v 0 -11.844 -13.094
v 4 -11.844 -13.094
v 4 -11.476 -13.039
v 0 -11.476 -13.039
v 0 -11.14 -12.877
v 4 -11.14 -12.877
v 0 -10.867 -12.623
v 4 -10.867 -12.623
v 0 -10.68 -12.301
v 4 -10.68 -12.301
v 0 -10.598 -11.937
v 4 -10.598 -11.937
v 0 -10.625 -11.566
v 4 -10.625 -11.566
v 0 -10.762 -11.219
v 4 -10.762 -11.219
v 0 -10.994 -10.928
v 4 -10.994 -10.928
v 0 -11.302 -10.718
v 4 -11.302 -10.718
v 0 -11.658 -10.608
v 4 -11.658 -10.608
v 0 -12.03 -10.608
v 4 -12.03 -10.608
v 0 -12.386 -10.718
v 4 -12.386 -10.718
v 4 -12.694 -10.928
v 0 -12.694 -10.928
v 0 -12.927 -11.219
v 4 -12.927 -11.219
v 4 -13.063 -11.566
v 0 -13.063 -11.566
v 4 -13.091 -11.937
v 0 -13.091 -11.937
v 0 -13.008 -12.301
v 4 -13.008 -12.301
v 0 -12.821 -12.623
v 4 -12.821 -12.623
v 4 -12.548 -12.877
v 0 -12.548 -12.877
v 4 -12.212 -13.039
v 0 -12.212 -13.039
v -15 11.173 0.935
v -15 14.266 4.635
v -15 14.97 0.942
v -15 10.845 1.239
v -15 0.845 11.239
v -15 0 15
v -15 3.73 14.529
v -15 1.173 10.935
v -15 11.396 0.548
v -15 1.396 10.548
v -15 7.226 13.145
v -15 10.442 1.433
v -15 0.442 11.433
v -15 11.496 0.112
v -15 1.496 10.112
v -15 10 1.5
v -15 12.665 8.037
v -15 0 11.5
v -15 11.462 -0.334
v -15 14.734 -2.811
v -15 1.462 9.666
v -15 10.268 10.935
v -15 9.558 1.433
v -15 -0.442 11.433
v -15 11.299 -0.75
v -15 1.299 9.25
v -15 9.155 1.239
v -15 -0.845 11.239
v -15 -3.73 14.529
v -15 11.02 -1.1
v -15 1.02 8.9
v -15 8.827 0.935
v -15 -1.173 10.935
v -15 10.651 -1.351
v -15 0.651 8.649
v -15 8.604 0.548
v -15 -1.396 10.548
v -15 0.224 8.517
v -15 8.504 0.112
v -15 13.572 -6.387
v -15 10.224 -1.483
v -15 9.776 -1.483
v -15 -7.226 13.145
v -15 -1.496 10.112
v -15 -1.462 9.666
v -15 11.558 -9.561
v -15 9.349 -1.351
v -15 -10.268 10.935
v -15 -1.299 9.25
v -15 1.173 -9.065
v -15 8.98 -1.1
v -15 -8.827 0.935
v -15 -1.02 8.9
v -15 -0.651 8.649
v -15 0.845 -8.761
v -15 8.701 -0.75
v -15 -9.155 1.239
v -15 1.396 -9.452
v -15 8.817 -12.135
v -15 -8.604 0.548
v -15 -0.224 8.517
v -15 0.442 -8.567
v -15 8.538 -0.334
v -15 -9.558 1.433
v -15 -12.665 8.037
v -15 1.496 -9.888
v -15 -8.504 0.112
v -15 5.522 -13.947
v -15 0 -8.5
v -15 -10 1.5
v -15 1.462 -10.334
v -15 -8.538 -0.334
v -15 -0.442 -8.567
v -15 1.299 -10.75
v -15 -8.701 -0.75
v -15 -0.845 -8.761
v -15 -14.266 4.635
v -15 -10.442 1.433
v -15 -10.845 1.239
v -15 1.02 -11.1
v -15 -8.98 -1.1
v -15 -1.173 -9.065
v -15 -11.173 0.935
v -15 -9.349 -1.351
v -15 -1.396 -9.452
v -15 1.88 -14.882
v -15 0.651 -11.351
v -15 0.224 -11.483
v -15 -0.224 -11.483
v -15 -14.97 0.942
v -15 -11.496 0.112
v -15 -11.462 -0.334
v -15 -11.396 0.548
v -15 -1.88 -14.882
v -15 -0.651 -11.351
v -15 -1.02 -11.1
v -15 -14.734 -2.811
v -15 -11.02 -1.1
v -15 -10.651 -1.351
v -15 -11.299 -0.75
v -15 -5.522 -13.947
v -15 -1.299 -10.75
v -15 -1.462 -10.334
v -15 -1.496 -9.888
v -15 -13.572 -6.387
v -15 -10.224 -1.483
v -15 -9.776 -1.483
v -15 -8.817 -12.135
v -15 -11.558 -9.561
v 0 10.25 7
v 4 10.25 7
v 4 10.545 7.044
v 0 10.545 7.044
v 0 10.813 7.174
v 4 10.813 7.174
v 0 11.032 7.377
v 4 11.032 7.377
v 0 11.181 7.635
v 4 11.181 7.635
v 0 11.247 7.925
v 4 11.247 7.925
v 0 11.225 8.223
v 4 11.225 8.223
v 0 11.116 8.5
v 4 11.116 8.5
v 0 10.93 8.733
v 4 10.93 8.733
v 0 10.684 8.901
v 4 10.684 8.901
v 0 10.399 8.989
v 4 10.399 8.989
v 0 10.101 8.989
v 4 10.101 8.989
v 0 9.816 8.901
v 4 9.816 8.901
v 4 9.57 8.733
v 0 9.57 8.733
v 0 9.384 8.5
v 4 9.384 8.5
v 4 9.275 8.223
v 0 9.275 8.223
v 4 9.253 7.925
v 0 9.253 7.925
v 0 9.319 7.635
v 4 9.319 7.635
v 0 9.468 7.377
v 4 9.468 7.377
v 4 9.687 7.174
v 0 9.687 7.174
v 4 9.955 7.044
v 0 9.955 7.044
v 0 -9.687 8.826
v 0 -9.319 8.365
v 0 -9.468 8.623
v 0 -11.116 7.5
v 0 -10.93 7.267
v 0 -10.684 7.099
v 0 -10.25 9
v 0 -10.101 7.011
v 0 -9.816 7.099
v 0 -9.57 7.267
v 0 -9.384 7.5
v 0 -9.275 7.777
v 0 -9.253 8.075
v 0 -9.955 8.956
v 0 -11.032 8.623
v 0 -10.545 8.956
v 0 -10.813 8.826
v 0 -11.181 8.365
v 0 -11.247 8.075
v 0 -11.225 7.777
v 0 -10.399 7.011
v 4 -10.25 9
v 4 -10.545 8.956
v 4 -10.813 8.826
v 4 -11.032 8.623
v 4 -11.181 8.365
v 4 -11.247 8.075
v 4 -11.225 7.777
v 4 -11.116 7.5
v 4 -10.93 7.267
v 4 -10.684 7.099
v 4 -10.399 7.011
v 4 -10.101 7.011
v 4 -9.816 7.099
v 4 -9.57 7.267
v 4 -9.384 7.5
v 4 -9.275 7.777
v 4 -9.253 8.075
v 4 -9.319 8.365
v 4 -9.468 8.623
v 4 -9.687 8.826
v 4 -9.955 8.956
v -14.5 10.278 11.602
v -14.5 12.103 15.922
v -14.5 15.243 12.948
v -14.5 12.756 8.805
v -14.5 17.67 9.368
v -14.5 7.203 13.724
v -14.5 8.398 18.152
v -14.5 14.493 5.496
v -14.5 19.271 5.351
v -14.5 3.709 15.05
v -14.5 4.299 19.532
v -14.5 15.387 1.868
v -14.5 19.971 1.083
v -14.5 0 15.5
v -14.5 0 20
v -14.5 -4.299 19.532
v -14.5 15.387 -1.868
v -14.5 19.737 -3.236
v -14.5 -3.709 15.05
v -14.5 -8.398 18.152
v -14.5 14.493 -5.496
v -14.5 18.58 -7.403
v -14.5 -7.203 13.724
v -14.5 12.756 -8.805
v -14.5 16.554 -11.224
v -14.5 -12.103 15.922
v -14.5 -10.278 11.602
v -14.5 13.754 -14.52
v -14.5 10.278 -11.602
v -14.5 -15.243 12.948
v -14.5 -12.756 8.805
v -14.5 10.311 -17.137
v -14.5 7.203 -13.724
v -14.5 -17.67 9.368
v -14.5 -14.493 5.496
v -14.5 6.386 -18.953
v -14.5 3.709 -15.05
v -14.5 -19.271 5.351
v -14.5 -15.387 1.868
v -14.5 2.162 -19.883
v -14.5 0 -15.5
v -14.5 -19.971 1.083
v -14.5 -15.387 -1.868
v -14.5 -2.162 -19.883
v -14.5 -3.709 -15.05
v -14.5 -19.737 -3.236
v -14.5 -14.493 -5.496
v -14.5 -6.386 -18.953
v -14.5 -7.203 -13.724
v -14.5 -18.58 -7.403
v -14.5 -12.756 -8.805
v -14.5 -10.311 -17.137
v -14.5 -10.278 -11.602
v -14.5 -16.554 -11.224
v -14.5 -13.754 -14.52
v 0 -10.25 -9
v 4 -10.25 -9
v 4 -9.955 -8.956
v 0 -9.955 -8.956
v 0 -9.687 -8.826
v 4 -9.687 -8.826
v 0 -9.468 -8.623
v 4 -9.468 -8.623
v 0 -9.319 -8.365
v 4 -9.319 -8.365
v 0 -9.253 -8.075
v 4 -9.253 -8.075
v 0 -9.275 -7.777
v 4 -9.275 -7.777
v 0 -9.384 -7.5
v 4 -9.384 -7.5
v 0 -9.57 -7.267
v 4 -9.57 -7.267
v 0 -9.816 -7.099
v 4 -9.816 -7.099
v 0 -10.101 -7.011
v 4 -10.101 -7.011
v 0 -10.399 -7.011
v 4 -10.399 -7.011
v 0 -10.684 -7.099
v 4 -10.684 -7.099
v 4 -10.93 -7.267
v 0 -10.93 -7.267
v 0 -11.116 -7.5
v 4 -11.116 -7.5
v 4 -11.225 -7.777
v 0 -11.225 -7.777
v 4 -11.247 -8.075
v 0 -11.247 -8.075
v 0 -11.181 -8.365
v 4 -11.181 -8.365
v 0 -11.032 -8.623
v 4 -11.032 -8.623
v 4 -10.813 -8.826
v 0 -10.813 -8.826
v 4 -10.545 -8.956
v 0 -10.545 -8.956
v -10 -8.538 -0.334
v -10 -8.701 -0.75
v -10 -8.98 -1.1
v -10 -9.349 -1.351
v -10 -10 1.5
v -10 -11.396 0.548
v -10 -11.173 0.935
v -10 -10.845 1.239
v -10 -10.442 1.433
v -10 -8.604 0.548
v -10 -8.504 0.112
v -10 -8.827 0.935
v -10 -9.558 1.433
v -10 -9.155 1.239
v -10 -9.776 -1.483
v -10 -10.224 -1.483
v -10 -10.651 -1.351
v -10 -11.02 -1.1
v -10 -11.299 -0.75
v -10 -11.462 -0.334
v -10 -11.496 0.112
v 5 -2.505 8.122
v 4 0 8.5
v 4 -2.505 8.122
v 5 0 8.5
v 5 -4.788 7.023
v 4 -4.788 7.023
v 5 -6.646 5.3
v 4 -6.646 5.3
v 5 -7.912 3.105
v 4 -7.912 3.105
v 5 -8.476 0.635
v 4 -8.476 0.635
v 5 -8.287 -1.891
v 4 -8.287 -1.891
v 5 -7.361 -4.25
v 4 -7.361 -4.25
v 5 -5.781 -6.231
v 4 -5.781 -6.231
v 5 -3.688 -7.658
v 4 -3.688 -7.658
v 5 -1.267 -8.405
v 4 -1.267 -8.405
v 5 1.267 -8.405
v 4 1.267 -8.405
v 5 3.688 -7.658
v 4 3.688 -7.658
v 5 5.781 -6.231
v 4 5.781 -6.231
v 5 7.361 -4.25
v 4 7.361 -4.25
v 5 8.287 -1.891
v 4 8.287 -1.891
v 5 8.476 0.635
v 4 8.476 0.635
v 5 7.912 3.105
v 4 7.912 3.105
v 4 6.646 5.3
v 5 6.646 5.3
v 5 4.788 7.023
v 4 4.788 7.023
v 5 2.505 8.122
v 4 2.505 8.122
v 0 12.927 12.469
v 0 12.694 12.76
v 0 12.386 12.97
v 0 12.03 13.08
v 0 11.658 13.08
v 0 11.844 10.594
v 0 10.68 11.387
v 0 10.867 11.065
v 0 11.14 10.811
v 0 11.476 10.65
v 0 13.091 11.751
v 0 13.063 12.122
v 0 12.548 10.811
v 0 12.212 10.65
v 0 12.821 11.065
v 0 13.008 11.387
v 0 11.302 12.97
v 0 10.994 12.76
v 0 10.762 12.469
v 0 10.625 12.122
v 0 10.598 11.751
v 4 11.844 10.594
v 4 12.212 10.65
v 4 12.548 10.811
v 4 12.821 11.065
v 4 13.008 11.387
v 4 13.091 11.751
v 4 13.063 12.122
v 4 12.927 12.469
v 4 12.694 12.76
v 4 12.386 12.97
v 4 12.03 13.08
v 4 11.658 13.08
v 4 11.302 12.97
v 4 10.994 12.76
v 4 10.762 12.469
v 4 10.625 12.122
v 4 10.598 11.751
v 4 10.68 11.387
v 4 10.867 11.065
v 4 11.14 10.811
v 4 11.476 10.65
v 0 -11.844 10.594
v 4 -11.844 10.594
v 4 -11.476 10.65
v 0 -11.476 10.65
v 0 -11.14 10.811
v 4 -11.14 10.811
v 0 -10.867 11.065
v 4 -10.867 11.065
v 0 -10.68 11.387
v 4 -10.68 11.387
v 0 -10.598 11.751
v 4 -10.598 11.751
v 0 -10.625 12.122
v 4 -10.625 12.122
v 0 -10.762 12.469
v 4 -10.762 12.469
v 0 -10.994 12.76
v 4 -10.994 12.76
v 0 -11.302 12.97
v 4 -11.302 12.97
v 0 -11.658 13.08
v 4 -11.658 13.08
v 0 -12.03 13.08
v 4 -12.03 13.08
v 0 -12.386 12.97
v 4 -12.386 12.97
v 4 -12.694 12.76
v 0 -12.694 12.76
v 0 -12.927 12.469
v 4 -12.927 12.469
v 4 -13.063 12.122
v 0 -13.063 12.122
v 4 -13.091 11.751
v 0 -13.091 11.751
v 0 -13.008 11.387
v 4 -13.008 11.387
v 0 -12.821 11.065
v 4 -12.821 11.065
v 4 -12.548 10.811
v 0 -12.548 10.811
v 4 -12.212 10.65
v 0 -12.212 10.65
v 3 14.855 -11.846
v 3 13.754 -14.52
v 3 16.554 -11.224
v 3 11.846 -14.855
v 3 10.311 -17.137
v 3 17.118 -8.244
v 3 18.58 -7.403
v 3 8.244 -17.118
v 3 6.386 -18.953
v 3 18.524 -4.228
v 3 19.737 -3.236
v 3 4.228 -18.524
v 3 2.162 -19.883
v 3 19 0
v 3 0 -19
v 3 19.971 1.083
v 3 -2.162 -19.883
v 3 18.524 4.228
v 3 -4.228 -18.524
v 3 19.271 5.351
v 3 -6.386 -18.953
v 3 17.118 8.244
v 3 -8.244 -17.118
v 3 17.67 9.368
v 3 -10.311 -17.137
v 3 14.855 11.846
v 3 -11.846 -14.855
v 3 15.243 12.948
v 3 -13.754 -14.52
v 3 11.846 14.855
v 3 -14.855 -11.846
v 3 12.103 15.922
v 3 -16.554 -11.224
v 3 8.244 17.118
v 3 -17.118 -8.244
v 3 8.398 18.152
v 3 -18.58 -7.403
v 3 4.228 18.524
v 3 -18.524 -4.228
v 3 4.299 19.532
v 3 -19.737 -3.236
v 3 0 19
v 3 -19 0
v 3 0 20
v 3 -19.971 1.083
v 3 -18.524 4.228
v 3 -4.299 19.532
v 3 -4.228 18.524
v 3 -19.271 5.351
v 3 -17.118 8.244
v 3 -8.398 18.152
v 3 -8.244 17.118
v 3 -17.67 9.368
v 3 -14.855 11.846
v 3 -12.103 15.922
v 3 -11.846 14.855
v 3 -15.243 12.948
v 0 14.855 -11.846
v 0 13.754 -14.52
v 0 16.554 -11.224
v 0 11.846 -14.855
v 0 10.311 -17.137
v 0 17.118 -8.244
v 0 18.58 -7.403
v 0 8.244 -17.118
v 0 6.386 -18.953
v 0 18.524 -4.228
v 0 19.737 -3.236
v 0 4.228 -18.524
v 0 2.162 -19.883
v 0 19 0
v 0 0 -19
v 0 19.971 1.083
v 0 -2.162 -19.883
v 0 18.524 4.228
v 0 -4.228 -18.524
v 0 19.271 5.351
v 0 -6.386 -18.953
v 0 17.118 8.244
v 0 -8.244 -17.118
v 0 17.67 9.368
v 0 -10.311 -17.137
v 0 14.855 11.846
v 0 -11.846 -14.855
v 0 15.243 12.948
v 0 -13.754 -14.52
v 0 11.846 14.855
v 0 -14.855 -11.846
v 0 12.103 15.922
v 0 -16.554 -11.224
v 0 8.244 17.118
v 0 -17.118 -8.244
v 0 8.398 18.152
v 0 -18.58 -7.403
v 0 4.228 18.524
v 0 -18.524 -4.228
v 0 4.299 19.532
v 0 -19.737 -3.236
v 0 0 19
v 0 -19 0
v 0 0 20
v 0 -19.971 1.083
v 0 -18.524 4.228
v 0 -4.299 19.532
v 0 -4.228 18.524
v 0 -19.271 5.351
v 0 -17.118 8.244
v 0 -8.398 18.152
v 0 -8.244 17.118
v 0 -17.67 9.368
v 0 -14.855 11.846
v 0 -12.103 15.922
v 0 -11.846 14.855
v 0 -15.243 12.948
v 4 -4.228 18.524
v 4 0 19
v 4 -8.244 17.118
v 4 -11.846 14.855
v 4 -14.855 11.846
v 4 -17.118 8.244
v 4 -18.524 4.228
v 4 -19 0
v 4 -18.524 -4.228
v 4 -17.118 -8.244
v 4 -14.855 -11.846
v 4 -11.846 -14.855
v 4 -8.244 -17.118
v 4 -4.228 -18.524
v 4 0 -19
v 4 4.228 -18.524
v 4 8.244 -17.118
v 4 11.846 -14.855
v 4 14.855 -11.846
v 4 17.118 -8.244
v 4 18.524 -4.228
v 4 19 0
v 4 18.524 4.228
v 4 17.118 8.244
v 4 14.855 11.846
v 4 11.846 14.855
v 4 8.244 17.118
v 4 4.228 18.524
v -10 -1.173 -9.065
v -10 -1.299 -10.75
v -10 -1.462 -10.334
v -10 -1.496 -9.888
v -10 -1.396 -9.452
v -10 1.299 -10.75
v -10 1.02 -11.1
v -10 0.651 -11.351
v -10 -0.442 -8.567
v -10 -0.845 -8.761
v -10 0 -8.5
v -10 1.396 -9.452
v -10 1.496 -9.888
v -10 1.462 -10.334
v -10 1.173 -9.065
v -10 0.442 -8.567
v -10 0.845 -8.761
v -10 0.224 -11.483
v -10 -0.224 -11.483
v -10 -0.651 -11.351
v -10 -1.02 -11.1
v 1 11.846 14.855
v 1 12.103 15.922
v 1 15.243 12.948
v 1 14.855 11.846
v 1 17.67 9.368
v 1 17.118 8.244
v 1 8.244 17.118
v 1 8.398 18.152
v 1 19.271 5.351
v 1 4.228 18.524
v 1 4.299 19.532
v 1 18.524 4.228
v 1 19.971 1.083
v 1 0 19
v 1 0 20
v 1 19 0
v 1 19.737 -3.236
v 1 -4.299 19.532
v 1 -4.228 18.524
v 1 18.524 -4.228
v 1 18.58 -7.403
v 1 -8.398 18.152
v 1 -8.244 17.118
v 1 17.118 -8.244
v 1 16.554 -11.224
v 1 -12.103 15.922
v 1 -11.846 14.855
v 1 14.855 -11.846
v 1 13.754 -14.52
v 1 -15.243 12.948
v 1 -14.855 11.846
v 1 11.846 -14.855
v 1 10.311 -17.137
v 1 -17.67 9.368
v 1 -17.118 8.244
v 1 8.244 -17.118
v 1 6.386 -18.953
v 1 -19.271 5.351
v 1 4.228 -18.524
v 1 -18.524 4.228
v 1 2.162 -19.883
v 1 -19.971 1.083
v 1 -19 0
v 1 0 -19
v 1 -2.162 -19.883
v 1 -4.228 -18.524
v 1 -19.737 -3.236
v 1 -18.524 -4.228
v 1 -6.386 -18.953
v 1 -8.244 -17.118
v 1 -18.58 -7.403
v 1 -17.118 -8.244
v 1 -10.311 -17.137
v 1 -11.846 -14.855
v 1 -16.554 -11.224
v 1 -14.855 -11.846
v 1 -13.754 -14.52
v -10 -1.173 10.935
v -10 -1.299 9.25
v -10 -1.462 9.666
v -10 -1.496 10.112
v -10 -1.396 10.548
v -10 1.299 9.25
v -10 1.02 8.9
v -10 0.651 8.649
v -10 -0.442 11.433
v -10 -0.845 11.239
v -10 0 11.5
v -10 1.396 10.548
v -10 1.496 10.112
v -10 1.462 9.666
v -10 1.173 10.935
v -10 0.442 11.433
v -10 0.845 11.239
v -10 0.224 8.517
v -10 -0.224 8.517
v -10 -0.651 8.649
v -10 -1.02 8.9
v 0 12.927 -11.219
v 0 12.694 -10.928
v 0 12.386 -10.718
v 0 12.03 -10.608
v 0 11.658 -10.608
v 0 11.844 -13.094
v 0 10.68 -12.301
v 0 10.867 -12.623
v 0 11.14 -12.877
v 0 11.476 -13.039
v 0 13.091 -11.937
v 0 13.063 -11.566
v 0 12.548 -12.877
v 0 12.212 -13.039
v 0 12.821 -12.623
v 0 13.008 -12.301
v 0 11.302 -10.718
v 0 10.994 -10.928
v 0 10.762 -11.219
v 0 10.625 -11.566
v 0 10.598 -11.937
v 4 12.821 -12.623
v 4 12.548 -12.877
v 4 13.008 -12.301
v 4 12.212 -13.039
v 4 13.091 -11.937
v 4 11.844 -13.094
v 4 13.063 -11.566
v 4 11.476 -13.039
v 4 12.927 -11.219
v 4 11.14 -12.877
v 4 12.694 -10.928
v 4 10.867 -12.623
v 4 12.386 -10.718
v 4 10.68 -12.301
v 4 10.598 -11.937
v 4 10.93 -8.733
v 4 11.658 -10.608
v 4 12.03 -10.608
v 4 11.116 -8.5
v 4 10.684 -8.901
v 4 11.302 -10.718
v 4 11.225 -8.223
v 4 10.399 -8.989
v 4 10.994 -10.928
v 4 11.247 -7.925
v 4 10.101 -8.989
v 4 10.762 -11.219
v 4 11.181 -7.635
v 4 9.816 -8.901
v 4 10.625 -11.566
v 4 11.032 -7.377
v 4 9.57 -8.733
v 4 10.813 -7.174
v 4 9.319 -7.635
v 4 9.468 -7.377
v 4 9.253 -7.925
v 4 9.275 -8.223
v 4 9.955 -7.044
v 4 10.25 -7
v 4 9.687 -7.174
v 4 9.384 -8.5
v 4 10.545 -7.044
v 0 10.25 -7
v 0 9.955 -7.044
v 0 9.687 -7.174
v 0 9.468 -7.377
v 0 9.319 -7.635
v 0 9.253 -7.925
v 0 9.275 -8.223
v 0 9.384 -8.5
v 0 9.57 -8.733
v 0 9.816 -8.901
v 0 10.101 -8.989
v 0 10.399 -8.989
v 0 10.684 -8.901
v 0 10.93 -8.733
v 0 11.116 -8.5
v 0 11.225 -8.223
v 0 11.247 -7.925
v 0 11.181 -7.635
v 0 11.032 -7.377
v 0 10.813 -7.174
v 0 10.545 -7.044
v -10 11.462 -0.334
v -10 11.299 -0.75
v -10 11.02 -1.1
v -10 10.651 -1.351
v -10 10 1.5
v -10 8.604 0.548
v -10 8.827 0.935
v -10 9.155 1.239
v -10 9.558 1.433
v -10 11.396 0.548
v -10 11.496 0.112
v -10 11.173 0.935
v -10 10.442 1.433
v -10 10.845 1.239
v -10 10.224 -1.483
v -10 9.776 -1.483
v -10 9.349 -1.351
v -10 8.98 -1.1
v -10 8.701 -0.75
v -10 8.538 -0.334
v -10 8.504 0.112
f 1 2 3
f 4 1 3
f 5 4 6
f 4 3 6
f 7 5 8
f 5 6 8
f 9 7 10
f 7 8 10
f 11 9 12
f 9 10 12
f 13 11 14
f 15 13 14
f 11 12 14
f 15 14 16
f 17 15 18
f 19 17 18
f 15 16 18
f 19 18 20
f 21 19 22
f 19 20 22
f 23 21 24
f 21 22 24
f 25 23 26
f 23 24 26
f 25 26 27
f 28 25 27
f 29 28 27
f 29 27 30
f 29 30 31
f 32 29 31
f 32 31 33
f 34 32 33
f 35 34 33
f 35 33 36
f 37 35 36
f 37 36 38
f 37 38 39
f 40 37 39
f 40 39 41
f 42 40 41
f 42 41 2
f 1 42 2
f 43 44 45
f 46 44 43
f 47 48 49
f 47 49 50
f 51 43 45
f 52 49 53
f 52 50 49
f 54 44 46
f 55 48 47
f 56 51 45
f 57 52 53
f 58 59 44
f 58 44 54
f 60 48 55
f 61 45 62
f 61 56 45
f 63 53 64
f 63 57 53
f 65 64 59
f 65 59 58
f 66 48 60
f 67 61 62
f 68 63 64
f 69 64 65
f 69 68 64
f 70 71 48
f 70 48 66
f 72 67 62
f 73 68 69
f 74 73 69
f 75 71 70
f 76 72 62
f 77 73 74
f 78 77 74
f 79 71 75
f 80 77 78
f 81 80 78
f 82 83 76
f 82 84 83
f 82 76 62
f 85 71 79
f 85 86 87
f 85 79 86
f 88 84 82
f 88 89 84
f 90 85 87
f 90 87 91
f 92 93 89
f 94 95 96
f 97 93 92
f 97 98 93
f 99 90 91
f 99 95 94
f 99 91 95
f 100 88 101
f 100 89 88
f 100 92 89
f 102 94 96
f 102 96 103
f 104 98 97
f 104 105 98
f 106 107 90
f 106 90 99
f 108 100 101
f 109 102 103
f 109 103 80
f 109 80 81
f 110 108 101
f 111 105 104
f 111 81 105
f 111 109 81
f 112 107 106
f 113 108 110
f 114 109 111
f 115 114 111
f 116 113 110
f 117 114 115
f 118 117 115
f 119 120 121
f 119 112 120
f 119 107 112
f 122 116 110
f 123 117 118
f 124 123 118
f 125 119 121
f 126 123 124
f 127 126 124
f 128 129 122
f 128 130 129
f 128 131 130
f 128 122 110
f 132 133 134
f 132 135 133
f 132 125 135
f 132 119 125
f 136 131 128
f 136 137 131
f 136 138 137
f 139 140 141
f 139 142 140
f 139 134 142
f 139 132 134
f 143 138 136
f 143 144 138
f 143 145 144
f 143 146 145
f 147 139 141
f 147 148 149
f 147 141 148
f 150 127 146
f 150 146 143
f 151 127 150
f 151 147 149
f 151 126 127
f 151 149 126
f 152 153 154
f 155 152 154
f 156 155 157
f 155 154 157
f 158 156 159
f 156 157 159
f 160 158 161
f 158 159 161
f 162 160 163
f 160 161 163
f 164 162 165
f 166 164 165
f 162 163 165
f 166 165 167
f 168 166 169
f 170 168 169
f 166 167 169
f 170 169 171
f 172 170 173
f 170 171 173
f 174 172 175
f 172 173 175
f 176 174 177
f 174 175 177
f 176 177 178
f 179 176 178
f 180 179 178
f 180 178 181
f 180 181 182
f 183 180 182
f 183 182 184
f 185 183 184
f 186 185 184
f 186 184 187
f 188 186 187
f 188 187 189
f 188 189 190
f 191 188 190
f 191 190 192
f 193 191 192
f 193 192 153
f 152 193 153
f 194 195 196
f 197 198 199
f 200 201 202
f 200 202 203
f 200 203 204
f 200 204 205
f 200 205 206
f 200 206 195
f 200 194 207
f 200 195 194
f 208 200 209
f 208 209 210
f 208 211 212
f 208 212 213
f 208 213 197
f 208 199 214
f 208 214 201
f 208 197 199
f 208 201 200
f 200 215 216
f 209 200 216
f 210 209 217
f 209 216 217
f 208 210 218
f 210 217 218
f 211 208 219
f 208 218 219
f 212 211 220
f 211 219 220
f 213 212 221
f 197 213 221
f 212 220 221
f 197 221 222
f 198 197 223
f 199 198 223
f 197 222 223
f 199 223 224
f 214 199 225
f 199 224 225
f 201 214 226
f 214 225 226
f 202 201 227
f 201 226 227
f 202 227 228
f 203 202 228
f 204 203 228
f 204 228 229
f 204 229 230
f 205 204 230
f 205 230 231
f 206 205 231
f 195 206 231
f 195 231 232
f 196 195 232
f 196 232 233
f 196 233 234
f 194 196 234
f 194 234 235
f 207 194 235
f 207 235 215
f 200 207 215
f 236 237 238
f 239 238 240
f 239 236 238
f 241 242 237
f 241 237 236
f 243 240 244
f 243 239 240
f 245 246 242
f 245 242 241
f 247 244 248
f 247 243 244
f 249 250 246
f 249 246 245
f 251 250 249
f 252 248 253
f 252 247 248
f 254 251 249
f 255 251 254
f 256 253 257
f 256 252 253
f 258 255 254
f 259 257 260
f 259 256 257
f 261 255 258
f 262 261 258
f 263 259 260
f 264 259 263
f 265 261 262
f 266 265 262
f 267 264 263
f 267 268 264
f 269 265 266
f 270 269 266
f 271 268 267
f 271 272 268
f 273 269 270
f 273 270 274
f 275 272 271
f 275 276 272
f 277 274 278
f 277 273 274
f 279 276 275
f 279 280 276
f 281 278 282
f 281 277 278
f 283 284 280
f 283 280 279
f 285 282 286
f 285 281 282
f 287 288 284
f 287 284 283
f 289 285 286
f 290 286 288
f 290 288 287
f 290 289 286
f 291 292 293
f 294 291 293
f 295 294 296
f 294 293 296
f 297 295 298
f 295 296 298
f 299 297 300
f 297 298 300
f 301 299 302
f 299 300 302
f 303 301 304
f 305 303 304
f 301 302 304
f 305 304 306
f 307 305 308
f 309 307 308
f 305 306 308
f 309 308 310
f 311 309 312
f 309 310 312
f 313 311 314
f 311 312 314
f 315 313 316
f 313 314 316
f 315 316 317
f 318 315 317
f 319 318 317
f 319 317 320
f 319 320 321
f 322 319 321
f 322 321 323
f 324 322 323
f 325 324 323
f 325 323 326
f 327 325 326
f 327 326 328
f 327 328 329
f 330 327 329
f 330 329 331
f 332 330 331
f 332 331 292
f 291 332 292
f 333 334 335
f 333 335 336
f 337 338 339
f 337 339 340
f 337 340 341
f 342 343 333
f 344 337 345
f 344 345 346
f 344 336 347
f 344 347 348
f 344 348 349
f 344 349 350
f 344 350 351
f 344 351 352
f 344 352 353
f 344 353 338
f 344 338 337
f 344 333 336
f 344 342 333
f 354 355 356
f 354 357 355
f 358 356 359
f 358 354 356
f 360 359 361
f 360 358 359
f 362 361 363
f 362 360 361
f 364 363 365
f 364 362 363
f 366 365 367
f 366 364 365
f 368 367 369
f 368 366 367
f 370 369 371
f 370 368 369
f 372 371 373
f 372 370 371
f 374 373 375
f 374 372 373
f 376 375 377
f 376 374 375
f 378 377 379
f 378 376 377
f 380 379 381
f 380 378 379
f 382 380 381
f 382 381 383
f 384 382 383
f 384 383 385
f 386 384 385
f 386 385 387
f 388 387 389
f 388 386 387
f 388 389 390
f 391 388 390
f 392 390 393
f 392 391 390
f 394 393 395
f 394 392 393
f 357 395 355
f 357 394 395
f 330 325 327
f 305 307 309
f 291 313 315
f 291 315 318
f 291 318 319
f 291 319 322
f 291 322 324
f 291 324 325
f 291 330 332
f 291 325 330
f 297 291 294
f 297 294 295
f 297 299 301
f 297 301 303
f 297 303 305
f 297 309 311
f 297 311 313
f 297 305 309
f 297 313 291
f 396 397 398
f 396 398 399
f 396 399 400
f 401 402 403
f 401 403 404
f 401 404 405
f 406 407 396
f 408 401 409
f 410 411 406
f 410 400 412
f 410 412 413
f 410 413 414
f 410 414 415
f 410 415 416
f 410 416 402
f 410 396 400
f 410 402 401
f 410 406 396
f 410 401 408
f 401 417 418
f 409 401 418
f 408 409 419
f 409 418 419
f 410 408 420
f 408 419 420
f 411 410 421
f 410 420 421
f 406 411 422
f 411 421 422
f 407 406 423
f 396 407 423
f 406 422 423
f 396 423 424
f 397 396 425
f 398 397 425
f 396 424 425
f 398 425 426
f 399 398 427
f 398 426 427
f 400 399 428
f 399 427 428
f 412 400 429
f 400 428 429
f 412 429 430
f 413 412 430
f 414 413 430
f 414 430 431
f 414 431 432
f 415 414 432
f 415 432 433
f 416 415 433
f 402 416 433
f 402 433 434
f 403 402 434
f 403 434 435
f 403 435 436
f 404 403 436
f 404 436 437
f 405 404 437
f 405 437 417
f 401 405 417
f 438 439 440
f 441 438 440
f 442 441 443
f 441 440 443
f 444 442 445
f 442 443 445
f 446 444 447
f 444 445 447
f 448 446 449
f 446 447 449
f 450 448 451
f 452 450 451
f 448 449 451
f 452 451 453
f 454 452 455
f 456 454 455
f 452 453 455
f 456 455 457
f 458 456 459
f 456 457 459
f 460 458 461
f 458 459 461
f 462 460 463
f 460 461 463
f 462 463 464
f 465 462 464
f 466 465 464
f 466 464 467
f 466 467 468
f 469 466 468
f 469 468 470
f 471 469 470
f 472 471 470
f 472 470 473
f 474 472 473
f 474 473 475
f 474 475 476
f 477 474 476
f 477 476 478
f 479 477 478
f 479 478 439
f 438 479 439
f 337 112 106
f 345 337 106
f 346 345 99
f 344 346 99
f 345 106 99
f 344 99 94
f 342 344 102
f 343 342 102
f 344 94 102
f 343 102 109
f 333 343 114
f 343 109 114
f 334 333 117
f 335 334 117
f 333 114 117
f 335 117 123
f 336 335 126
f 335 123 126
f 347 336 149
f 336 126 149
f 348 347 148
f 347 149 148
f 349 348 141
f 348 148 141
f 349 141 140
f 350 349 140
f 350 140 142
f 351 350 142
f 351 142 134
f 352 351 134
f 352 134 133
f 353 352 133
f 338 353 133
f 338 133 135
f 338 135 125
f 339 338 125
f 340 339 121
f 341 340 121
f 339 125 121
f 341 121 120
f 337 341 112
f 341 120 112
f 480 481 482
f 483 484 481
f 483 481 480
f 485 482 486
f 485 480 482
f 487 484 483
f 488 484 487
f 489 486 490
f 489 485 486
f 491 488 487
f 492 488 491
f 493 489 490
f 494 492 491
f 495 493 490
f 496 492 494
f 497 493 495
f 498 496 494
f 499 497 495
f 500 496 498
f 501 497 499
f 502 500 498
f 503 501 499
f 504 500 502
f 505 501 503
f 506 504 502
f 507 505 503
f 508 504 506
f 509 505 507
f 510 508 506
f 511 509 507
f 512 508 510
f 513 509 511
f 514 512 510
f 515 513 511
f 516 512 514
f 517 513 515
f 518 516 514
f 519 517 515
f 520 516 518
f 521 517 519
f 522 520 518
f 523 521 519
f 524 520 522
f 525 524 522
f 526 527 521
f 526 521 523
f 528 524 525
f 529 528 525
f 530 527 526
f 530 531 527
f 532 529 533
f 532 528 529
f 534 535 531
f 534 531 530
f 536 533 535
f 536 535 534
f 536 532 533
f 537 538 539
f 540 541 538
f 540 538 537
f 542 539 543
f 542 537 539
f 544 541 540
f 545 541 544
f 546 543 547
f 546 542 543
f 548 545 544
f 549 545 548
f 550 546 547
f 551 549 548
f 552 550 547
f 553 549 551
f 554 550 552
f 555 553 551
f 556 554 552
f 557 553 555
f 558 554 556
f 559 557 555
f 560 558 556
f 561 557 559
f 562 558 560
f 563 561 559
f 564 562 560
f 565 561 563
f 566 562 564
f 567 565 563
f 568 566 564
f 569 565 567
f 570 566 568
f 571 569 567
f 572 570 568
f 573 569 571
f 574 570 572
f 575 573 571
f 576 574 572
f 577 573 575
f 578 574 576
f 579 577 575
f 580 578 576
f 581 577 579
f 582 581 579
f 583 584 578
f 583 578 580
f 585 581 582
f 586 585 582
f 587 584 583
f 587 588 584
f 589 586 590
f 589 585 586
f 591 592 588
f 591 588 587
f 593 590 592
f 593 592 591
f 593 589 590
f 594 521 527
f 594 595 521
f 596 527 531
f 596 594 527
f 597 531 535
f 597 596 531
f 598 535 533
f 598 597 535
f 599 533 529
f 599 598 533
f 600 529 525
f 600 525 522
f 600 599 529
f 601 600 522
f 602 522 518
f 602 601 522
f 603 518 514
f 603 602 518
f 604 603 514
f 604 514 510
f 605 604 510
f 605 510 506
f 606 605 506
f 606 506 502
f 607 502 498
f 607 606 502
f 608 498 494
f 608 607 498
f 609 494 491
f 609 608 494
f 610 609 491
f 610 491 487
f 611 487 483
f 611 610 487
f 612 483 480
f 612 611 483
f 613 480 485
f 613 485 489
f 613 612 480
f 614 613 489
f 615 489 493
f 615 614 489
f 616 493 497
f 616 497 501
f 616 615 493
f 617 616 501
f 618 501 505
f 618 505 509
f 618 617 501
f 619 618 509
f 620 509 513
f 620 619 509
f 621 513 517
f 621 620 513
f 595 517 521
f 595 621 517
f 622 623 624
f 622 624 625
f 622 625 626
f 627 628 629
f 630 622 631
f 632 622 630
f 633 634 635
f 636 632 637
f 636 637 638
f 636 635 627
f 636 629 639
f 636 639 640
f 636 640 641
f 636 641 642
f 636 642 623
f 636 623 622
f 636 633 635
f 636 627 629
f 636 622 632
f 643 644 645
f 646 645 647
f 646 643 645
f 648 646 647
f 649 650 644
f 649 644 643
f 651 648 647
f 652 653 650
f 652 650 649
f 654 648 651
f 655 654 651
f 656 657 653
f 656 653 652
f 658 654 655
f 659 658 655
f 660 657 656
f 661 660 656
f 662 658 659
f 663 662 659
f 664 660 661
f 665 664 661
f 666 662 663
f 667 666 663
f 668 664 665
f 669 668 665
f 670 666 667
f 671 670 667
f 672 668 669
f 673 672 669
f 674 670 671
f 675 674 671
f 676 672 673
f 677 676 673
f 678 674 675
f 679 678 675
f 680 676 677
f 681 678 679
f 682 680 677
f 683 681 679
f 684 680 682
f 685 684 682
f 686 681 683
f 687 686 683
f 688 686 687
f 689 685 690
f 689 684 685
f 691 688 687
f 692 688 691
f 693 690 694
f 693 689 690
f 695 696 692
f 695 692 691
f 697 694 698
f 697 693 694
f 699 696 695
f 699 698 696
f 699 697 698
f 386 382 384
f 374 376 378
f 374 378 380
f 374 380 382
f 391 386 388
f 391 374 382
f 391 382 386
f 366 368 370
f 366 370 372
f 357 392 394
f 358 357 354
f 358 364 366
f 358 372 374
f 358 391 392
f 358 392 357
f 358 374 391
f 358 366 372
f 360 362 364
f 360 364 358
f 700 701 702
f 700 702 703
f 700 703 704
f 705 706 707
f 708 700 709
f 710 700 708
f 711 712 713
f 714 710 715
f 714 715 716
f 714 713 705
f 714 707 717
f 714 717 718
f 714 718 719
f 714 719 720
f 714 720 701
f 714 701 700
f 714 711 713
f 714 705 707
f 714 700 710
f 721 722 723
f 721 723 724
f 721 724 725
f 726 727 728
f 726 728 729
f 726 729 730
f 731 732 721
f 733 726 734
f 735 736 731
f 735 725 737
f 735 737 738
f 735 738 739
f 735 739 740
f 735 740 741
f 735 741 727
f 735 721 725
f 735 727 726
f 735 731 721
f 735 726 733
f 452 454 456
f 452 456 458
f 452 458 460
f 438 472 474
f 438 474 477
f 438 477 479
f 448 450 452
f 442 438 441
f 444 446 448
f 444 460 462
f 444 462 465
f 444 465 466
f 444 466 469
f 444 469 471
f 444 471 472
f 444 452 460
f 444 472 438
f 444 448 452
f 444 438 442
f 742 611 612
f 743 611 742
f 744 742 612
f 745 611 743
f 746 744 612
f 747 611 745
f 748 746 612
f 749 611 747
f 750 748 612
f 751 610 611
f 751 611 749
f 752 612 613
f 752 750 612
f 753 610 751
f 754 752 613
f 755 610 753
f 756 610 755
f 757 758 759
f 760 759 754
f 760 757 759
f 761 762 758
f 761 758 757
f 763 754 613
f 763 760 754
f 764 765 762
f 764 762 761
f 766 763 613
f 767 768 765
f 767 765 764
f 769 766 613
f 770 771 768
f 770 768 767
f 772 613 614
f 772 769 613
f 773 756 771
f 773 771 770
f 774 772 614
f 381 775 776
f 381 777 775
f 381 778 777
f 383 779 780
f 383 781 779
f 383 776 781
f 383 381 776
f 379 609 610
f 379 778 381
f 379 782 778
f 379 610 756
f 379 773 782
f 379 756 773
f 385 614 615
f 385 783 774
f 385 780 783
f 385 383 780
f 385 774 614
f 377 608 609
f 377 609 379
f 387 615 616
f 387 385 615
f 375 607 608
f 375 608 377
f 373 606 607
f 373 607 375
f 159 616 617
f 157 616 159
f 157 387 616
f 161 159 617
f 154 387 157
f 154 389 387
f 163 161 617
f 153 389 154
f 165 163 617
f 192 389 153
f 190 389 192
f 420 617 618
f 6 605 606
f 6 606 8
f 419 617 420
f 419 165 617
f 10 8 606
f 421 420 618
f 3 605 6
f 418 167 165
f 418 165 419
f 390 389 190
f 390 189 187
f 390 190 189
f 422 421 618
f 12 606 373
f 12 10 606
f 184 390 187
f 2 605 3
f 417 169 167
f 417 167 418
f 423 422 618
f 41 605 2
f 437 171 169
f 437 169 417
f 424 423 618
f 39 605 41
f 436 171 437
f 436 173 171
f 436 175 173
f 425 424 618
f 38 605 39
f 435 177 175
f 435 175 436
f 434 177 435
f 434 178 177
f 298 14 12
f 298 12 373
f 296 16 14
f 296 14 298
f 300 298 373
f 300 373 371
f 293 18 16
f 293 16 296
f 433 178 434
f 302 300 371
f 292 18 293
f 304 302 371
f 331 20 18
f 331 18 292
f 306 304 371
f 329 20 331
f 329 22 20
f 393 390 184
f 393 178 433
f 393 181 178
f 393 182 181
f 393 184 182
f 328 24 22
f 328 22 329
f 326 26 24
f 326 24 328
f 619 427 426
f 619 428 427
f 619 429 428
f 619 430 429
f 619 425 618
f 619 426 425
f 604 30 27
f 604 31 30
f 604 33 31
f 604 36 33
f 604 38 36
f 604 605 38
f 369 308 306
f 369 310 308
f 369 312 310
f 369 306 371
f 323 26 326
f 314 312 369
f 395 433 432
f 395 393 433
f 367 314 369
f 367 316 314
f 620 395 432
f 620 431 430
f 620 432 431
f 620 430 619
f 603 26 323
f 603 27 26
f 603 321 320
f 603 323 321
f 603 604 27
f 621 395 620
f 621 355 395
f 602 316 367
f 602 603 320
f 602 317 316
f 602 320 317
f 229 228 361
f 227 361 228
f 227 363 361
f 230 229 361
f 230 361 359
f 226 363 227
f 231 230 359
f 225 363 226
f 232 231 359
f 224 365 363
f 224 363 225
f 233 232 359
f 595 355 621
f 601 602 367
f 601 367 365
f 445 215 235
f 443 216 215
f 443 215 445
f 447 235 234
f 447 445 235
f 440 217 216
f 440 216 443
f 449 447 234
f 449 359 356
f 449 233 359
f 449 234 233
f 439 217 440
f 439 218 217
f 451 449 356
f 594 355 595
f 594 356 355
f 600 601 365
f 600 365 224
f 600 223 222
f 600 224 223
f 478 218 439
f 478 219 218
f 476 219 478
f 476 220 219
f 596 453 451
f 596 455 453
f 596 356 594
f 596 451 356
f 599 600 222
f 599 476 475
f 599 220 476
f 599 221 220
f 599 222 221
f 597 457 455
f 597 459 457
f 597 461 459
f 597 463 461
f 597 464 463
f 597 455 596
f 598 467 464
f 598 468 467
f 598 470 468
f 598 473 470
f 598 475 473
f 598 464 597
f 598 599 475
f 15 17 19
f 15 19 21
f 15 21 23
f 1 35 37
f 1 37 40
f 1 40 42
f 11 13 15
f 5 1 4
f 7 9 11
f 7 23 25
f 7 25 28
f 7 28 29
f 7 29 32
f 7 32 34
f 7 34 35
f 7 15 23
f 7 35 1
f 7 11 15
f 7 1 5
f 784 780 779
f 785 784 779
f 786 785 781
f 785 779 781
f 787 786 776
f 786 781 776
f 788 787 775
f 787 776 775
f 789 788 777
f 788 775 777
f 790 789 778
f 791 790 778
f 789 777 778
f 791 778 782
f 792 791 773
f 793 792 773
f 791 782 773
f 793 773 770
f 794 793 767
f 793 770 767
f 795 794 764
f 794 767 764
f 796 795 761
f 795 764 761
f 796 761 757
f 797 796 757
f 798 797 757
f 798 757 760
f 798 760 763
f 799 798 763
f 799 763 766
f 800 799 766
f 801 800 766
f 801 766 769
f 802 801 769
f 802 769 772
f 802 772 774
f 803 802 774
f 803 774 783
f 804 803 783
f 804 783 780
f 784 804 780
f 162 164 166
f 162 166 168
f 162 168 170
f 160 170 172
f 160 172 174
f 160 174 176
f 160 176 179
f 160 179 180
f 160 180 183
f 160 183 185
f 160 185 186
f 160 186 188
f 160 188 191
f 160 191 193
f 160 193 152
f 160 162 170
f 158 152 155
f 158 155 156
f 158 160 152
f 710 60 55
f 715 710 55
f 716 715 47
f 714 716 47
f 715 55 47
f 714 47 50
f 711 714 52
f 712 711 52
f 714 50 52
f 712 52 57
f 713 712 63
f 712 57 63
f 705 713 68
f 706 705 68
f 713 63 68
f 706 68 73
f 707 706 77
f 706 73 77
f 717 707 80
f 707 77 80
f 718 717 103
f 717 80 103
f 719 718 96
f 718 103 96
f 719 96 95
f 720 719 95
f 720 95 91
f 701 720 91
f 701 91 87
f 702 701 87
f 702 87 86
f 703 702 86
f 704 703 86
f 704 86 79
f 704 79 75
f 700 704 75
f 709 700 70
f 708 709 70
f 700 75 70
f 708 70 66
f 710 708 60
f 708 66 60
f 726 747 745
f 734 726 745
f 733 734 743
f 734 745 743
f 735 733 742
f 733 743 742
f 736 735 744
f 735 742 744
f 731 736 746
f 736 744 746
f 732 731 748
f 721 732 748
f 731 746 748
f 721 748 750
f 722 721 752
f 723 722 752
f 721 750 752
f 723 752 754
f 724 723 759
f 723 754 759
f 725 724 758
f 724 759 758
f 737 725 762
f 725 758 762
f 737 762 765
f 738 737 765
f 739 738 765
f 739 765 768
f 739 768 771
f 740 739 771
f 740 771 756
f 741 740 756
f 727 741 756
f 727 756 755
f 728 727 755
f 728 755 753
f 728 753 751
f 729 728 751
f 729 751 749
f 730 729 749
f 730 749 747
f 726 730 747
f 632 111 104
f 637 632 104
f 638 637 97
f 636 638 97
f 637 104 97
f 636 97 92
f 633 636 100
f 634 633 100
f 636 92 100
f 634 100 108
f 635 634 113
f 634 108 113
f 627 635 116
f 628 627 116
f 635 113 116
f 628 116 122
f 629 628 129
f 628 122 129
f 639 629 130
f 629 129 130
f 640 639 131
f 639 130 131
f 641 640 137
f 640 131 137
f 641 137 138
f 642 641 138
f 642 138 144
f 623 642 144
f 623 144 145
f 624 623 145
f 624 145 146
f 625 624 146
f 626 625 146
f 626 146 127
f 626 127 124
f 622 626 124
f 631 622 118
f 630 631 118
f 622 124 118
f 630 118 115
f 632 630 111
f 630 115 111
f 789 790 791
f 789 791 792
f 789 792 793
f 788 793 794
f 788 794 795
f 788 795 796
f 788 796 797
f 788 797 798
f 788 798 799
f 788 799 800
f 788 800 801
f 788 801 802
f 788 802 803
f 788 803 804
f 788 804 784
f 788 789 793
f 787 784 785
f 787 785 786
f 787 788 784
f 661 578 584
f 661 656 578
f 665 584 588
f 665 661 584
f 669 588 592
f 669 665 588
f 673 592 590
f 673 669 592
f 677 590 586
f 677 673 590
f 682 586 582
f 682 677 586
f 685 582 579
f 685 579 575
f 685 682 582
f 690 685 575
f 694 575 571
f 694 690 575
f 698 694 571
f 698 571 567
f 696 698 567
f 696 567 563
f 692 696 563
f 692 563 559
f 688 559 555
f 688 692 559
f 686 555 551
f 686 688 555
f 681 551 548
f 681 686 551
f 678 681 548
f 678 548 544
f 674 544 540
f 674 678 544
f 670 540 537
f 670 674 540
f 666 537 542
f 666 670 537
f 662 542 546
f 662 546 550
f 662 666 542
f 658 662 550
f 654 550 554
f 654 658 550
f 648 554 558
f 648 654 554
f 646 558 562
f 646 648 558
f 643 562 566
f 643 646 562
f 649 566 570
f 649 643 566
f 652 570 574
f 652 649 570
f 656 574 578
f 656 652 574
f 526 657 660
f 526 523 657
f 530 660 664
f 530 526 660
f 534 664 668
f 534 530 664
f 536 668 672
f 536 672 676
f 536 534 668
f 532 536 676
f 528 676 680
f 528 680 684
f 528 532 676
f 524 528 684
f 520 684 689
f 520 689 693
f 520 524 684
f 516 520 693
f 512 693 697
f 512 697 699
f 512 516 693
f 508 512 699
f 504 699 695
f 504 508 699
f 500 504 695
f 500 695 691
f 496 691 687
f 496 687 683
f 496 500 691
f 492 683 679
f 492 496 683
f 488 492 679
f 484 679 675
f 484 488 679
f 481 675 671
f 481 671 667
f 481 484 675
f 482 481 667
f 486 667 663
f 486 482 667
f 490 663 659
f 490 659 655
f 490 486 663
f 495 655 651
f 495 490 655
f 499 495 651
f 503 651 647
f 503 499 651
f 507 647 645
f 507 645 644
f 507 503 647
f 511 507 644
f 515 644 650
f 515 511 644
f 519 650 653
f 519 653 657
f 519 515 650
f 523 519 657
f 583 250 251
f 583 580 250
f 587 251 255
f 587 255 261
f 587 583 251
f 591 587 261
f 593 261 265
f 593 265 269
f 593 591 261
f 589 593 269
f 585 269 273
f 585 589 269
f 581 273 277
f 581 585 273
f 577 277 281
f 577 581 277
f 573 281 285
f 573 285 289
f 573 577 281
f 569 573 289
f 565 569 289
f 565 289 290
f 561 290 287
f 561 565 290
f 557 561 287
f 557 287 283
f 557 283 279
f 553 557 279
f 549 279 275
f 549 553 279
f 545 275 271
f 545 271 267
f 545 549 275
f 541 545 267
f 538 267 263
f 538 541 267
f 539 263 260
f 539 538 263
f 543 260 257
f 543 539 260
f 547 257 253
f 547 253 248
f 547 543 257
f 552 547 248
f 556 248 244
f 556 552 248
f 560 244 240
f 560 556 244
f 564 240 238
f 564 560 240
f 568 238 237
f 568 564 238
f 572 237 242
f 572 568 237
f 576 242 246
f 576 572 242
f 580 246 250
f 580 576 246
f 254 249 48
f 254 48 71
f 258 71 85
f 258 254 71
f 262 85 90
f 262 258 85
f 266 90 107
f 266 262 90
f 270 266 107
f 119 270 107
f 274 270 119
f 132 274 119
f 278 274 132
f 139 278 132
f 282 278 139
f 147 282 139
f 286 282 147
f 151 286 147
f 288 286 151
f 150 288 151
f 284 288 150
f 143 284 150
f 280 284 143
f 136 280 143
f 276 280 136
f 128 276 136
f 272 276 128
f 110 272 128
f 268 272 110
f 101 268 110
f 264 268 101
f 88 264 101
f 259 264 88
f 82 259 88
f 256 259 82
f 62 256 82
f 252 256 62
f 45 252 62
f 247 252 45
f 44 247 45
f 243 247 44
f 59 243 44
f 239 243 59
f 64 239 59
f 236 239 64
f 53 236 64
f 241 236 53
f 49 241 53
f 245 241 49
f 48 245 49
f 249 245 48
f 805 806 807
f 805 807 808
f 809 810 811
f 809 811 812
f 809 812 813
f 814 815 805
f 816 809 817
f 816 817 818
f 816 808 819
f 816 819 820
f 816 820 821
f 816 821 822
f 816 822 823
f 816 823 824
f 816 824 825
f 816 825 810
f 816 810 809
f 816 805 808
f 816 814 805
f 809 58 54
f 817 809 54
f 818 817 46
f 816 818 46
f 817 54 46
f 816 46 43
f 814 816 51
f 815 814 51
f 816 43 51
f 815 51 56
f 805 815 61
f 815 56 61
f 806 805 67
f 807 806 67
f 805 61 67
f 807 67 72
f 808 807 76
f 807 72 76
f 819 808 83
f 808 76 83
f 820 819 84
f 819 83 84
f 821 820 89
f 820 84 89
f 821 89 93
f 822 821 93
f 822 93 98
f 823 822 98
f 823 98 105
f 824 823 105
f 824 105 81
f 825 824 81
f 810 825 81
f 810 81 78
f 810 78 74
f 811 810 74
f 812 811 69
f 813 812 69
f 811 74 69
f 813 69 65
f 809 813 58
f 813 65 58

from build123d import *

# Parameters (mm, degrees)
CHAMFER_1_SIZE      = 0.5
SKETCH_2_R          = 1.5
CUT_EXTRUDE_1_DEPTH = 5
SKETCH_3_R          = 1
SKETCH_3_R_2        = 1.25
CUT_EXTRUDE_2_DEPTH = 5


with BuildPart() as part:
    # 草图1 → 旋转1 (revolve)
    with BuildSketch(Plane(origin=(0, 0, 0), x_dir=(1, 0, 0), z_dir=(0, 1, 0)), mode=Mode.PRIVATE) as revolve_1_sk:
        Polygon((0, 19), (1, 19), (1, 20), (3, 20), (3, 19), (4, 19), (4, 8.5), (5, 8.5), (5, 0), (0, 0), (-15, 0), (-15, 15), (-14.5, 15), (-14.5, 20), (0, 20), align=None)
    revolve(revolve_1_sk.sketch.rotate(Axis((-9.646406884, 0, 0), (1, 0, 0)), 180), axis=Axis((-9.646406884, 0, 0), (1, 0, 0)))

    # 倒角1
    chamfer_1_edges = [part.edges().sort_by_distance(p)[0] for p in [
        (-14.5, 0, -15),
    ]]
    chamfer(chamfer_1_edges, length=CHAMFER_1_SIZE - 0.0001)  # a hair under: the kernel refuses the full size

    # 草图2 → 切除-拉伸1 (cut)
    with BuildSketch(Plane.ZY.offset(15)):
        with Locations((0, 10)):
            Circle(SKETCH_2_R)
        with Locations((10, 0)):
            Circle(SKETCH_2_R)
        with Locations((0, -10)):
            Circle(SKETCH_2_R)
        with Locations((-10, 0)):
            Circle(SKETCH_2_R)
    extrude(amount=-CUT_EXTRUDE_1_DEPTH, mode=Mode.SUBTRACT)

    # 草图3 → 切除-拉伸2 (cut)
    with BuildSketch(Plane(origin=(5, 0, 0), x_dir=(0, 0, -1), z_dir=(1, 0, 0))):
        with Locations((-8, 10.25)):
            Circle(SKETCH_3_R)
        with Locations(Location((8, 10.25, 0), (0, 0, 180))):
            Circle(SKETCH_3_R)
        with Locations((8, -10.25)):
            Circle(SKETCH_3_R)
        with Locations(Location((-8, -10.25, 0), (0, 0, 180))):
            Circle(SKETCH_3_R)
        with Locations((-11.844038585, 11.844038585)):
            Circle(SKETCH_3_R_2)
        with Locations((11.844038585, 11.844038585)):
            Circle(SKETCH_3_R_2)
        with Locations((11.844038585, -11.844038585)):
            Circle(SKETCH_3_R_2)
        with Locations((-11.844038585, -11.844038585)):
            Circle(SKETCH_3_R_2)
    extrude(amount=-CUT_EXTRUDE_2_DEPTH, mode=Mode.SUBTRACT)


solid = part.part
